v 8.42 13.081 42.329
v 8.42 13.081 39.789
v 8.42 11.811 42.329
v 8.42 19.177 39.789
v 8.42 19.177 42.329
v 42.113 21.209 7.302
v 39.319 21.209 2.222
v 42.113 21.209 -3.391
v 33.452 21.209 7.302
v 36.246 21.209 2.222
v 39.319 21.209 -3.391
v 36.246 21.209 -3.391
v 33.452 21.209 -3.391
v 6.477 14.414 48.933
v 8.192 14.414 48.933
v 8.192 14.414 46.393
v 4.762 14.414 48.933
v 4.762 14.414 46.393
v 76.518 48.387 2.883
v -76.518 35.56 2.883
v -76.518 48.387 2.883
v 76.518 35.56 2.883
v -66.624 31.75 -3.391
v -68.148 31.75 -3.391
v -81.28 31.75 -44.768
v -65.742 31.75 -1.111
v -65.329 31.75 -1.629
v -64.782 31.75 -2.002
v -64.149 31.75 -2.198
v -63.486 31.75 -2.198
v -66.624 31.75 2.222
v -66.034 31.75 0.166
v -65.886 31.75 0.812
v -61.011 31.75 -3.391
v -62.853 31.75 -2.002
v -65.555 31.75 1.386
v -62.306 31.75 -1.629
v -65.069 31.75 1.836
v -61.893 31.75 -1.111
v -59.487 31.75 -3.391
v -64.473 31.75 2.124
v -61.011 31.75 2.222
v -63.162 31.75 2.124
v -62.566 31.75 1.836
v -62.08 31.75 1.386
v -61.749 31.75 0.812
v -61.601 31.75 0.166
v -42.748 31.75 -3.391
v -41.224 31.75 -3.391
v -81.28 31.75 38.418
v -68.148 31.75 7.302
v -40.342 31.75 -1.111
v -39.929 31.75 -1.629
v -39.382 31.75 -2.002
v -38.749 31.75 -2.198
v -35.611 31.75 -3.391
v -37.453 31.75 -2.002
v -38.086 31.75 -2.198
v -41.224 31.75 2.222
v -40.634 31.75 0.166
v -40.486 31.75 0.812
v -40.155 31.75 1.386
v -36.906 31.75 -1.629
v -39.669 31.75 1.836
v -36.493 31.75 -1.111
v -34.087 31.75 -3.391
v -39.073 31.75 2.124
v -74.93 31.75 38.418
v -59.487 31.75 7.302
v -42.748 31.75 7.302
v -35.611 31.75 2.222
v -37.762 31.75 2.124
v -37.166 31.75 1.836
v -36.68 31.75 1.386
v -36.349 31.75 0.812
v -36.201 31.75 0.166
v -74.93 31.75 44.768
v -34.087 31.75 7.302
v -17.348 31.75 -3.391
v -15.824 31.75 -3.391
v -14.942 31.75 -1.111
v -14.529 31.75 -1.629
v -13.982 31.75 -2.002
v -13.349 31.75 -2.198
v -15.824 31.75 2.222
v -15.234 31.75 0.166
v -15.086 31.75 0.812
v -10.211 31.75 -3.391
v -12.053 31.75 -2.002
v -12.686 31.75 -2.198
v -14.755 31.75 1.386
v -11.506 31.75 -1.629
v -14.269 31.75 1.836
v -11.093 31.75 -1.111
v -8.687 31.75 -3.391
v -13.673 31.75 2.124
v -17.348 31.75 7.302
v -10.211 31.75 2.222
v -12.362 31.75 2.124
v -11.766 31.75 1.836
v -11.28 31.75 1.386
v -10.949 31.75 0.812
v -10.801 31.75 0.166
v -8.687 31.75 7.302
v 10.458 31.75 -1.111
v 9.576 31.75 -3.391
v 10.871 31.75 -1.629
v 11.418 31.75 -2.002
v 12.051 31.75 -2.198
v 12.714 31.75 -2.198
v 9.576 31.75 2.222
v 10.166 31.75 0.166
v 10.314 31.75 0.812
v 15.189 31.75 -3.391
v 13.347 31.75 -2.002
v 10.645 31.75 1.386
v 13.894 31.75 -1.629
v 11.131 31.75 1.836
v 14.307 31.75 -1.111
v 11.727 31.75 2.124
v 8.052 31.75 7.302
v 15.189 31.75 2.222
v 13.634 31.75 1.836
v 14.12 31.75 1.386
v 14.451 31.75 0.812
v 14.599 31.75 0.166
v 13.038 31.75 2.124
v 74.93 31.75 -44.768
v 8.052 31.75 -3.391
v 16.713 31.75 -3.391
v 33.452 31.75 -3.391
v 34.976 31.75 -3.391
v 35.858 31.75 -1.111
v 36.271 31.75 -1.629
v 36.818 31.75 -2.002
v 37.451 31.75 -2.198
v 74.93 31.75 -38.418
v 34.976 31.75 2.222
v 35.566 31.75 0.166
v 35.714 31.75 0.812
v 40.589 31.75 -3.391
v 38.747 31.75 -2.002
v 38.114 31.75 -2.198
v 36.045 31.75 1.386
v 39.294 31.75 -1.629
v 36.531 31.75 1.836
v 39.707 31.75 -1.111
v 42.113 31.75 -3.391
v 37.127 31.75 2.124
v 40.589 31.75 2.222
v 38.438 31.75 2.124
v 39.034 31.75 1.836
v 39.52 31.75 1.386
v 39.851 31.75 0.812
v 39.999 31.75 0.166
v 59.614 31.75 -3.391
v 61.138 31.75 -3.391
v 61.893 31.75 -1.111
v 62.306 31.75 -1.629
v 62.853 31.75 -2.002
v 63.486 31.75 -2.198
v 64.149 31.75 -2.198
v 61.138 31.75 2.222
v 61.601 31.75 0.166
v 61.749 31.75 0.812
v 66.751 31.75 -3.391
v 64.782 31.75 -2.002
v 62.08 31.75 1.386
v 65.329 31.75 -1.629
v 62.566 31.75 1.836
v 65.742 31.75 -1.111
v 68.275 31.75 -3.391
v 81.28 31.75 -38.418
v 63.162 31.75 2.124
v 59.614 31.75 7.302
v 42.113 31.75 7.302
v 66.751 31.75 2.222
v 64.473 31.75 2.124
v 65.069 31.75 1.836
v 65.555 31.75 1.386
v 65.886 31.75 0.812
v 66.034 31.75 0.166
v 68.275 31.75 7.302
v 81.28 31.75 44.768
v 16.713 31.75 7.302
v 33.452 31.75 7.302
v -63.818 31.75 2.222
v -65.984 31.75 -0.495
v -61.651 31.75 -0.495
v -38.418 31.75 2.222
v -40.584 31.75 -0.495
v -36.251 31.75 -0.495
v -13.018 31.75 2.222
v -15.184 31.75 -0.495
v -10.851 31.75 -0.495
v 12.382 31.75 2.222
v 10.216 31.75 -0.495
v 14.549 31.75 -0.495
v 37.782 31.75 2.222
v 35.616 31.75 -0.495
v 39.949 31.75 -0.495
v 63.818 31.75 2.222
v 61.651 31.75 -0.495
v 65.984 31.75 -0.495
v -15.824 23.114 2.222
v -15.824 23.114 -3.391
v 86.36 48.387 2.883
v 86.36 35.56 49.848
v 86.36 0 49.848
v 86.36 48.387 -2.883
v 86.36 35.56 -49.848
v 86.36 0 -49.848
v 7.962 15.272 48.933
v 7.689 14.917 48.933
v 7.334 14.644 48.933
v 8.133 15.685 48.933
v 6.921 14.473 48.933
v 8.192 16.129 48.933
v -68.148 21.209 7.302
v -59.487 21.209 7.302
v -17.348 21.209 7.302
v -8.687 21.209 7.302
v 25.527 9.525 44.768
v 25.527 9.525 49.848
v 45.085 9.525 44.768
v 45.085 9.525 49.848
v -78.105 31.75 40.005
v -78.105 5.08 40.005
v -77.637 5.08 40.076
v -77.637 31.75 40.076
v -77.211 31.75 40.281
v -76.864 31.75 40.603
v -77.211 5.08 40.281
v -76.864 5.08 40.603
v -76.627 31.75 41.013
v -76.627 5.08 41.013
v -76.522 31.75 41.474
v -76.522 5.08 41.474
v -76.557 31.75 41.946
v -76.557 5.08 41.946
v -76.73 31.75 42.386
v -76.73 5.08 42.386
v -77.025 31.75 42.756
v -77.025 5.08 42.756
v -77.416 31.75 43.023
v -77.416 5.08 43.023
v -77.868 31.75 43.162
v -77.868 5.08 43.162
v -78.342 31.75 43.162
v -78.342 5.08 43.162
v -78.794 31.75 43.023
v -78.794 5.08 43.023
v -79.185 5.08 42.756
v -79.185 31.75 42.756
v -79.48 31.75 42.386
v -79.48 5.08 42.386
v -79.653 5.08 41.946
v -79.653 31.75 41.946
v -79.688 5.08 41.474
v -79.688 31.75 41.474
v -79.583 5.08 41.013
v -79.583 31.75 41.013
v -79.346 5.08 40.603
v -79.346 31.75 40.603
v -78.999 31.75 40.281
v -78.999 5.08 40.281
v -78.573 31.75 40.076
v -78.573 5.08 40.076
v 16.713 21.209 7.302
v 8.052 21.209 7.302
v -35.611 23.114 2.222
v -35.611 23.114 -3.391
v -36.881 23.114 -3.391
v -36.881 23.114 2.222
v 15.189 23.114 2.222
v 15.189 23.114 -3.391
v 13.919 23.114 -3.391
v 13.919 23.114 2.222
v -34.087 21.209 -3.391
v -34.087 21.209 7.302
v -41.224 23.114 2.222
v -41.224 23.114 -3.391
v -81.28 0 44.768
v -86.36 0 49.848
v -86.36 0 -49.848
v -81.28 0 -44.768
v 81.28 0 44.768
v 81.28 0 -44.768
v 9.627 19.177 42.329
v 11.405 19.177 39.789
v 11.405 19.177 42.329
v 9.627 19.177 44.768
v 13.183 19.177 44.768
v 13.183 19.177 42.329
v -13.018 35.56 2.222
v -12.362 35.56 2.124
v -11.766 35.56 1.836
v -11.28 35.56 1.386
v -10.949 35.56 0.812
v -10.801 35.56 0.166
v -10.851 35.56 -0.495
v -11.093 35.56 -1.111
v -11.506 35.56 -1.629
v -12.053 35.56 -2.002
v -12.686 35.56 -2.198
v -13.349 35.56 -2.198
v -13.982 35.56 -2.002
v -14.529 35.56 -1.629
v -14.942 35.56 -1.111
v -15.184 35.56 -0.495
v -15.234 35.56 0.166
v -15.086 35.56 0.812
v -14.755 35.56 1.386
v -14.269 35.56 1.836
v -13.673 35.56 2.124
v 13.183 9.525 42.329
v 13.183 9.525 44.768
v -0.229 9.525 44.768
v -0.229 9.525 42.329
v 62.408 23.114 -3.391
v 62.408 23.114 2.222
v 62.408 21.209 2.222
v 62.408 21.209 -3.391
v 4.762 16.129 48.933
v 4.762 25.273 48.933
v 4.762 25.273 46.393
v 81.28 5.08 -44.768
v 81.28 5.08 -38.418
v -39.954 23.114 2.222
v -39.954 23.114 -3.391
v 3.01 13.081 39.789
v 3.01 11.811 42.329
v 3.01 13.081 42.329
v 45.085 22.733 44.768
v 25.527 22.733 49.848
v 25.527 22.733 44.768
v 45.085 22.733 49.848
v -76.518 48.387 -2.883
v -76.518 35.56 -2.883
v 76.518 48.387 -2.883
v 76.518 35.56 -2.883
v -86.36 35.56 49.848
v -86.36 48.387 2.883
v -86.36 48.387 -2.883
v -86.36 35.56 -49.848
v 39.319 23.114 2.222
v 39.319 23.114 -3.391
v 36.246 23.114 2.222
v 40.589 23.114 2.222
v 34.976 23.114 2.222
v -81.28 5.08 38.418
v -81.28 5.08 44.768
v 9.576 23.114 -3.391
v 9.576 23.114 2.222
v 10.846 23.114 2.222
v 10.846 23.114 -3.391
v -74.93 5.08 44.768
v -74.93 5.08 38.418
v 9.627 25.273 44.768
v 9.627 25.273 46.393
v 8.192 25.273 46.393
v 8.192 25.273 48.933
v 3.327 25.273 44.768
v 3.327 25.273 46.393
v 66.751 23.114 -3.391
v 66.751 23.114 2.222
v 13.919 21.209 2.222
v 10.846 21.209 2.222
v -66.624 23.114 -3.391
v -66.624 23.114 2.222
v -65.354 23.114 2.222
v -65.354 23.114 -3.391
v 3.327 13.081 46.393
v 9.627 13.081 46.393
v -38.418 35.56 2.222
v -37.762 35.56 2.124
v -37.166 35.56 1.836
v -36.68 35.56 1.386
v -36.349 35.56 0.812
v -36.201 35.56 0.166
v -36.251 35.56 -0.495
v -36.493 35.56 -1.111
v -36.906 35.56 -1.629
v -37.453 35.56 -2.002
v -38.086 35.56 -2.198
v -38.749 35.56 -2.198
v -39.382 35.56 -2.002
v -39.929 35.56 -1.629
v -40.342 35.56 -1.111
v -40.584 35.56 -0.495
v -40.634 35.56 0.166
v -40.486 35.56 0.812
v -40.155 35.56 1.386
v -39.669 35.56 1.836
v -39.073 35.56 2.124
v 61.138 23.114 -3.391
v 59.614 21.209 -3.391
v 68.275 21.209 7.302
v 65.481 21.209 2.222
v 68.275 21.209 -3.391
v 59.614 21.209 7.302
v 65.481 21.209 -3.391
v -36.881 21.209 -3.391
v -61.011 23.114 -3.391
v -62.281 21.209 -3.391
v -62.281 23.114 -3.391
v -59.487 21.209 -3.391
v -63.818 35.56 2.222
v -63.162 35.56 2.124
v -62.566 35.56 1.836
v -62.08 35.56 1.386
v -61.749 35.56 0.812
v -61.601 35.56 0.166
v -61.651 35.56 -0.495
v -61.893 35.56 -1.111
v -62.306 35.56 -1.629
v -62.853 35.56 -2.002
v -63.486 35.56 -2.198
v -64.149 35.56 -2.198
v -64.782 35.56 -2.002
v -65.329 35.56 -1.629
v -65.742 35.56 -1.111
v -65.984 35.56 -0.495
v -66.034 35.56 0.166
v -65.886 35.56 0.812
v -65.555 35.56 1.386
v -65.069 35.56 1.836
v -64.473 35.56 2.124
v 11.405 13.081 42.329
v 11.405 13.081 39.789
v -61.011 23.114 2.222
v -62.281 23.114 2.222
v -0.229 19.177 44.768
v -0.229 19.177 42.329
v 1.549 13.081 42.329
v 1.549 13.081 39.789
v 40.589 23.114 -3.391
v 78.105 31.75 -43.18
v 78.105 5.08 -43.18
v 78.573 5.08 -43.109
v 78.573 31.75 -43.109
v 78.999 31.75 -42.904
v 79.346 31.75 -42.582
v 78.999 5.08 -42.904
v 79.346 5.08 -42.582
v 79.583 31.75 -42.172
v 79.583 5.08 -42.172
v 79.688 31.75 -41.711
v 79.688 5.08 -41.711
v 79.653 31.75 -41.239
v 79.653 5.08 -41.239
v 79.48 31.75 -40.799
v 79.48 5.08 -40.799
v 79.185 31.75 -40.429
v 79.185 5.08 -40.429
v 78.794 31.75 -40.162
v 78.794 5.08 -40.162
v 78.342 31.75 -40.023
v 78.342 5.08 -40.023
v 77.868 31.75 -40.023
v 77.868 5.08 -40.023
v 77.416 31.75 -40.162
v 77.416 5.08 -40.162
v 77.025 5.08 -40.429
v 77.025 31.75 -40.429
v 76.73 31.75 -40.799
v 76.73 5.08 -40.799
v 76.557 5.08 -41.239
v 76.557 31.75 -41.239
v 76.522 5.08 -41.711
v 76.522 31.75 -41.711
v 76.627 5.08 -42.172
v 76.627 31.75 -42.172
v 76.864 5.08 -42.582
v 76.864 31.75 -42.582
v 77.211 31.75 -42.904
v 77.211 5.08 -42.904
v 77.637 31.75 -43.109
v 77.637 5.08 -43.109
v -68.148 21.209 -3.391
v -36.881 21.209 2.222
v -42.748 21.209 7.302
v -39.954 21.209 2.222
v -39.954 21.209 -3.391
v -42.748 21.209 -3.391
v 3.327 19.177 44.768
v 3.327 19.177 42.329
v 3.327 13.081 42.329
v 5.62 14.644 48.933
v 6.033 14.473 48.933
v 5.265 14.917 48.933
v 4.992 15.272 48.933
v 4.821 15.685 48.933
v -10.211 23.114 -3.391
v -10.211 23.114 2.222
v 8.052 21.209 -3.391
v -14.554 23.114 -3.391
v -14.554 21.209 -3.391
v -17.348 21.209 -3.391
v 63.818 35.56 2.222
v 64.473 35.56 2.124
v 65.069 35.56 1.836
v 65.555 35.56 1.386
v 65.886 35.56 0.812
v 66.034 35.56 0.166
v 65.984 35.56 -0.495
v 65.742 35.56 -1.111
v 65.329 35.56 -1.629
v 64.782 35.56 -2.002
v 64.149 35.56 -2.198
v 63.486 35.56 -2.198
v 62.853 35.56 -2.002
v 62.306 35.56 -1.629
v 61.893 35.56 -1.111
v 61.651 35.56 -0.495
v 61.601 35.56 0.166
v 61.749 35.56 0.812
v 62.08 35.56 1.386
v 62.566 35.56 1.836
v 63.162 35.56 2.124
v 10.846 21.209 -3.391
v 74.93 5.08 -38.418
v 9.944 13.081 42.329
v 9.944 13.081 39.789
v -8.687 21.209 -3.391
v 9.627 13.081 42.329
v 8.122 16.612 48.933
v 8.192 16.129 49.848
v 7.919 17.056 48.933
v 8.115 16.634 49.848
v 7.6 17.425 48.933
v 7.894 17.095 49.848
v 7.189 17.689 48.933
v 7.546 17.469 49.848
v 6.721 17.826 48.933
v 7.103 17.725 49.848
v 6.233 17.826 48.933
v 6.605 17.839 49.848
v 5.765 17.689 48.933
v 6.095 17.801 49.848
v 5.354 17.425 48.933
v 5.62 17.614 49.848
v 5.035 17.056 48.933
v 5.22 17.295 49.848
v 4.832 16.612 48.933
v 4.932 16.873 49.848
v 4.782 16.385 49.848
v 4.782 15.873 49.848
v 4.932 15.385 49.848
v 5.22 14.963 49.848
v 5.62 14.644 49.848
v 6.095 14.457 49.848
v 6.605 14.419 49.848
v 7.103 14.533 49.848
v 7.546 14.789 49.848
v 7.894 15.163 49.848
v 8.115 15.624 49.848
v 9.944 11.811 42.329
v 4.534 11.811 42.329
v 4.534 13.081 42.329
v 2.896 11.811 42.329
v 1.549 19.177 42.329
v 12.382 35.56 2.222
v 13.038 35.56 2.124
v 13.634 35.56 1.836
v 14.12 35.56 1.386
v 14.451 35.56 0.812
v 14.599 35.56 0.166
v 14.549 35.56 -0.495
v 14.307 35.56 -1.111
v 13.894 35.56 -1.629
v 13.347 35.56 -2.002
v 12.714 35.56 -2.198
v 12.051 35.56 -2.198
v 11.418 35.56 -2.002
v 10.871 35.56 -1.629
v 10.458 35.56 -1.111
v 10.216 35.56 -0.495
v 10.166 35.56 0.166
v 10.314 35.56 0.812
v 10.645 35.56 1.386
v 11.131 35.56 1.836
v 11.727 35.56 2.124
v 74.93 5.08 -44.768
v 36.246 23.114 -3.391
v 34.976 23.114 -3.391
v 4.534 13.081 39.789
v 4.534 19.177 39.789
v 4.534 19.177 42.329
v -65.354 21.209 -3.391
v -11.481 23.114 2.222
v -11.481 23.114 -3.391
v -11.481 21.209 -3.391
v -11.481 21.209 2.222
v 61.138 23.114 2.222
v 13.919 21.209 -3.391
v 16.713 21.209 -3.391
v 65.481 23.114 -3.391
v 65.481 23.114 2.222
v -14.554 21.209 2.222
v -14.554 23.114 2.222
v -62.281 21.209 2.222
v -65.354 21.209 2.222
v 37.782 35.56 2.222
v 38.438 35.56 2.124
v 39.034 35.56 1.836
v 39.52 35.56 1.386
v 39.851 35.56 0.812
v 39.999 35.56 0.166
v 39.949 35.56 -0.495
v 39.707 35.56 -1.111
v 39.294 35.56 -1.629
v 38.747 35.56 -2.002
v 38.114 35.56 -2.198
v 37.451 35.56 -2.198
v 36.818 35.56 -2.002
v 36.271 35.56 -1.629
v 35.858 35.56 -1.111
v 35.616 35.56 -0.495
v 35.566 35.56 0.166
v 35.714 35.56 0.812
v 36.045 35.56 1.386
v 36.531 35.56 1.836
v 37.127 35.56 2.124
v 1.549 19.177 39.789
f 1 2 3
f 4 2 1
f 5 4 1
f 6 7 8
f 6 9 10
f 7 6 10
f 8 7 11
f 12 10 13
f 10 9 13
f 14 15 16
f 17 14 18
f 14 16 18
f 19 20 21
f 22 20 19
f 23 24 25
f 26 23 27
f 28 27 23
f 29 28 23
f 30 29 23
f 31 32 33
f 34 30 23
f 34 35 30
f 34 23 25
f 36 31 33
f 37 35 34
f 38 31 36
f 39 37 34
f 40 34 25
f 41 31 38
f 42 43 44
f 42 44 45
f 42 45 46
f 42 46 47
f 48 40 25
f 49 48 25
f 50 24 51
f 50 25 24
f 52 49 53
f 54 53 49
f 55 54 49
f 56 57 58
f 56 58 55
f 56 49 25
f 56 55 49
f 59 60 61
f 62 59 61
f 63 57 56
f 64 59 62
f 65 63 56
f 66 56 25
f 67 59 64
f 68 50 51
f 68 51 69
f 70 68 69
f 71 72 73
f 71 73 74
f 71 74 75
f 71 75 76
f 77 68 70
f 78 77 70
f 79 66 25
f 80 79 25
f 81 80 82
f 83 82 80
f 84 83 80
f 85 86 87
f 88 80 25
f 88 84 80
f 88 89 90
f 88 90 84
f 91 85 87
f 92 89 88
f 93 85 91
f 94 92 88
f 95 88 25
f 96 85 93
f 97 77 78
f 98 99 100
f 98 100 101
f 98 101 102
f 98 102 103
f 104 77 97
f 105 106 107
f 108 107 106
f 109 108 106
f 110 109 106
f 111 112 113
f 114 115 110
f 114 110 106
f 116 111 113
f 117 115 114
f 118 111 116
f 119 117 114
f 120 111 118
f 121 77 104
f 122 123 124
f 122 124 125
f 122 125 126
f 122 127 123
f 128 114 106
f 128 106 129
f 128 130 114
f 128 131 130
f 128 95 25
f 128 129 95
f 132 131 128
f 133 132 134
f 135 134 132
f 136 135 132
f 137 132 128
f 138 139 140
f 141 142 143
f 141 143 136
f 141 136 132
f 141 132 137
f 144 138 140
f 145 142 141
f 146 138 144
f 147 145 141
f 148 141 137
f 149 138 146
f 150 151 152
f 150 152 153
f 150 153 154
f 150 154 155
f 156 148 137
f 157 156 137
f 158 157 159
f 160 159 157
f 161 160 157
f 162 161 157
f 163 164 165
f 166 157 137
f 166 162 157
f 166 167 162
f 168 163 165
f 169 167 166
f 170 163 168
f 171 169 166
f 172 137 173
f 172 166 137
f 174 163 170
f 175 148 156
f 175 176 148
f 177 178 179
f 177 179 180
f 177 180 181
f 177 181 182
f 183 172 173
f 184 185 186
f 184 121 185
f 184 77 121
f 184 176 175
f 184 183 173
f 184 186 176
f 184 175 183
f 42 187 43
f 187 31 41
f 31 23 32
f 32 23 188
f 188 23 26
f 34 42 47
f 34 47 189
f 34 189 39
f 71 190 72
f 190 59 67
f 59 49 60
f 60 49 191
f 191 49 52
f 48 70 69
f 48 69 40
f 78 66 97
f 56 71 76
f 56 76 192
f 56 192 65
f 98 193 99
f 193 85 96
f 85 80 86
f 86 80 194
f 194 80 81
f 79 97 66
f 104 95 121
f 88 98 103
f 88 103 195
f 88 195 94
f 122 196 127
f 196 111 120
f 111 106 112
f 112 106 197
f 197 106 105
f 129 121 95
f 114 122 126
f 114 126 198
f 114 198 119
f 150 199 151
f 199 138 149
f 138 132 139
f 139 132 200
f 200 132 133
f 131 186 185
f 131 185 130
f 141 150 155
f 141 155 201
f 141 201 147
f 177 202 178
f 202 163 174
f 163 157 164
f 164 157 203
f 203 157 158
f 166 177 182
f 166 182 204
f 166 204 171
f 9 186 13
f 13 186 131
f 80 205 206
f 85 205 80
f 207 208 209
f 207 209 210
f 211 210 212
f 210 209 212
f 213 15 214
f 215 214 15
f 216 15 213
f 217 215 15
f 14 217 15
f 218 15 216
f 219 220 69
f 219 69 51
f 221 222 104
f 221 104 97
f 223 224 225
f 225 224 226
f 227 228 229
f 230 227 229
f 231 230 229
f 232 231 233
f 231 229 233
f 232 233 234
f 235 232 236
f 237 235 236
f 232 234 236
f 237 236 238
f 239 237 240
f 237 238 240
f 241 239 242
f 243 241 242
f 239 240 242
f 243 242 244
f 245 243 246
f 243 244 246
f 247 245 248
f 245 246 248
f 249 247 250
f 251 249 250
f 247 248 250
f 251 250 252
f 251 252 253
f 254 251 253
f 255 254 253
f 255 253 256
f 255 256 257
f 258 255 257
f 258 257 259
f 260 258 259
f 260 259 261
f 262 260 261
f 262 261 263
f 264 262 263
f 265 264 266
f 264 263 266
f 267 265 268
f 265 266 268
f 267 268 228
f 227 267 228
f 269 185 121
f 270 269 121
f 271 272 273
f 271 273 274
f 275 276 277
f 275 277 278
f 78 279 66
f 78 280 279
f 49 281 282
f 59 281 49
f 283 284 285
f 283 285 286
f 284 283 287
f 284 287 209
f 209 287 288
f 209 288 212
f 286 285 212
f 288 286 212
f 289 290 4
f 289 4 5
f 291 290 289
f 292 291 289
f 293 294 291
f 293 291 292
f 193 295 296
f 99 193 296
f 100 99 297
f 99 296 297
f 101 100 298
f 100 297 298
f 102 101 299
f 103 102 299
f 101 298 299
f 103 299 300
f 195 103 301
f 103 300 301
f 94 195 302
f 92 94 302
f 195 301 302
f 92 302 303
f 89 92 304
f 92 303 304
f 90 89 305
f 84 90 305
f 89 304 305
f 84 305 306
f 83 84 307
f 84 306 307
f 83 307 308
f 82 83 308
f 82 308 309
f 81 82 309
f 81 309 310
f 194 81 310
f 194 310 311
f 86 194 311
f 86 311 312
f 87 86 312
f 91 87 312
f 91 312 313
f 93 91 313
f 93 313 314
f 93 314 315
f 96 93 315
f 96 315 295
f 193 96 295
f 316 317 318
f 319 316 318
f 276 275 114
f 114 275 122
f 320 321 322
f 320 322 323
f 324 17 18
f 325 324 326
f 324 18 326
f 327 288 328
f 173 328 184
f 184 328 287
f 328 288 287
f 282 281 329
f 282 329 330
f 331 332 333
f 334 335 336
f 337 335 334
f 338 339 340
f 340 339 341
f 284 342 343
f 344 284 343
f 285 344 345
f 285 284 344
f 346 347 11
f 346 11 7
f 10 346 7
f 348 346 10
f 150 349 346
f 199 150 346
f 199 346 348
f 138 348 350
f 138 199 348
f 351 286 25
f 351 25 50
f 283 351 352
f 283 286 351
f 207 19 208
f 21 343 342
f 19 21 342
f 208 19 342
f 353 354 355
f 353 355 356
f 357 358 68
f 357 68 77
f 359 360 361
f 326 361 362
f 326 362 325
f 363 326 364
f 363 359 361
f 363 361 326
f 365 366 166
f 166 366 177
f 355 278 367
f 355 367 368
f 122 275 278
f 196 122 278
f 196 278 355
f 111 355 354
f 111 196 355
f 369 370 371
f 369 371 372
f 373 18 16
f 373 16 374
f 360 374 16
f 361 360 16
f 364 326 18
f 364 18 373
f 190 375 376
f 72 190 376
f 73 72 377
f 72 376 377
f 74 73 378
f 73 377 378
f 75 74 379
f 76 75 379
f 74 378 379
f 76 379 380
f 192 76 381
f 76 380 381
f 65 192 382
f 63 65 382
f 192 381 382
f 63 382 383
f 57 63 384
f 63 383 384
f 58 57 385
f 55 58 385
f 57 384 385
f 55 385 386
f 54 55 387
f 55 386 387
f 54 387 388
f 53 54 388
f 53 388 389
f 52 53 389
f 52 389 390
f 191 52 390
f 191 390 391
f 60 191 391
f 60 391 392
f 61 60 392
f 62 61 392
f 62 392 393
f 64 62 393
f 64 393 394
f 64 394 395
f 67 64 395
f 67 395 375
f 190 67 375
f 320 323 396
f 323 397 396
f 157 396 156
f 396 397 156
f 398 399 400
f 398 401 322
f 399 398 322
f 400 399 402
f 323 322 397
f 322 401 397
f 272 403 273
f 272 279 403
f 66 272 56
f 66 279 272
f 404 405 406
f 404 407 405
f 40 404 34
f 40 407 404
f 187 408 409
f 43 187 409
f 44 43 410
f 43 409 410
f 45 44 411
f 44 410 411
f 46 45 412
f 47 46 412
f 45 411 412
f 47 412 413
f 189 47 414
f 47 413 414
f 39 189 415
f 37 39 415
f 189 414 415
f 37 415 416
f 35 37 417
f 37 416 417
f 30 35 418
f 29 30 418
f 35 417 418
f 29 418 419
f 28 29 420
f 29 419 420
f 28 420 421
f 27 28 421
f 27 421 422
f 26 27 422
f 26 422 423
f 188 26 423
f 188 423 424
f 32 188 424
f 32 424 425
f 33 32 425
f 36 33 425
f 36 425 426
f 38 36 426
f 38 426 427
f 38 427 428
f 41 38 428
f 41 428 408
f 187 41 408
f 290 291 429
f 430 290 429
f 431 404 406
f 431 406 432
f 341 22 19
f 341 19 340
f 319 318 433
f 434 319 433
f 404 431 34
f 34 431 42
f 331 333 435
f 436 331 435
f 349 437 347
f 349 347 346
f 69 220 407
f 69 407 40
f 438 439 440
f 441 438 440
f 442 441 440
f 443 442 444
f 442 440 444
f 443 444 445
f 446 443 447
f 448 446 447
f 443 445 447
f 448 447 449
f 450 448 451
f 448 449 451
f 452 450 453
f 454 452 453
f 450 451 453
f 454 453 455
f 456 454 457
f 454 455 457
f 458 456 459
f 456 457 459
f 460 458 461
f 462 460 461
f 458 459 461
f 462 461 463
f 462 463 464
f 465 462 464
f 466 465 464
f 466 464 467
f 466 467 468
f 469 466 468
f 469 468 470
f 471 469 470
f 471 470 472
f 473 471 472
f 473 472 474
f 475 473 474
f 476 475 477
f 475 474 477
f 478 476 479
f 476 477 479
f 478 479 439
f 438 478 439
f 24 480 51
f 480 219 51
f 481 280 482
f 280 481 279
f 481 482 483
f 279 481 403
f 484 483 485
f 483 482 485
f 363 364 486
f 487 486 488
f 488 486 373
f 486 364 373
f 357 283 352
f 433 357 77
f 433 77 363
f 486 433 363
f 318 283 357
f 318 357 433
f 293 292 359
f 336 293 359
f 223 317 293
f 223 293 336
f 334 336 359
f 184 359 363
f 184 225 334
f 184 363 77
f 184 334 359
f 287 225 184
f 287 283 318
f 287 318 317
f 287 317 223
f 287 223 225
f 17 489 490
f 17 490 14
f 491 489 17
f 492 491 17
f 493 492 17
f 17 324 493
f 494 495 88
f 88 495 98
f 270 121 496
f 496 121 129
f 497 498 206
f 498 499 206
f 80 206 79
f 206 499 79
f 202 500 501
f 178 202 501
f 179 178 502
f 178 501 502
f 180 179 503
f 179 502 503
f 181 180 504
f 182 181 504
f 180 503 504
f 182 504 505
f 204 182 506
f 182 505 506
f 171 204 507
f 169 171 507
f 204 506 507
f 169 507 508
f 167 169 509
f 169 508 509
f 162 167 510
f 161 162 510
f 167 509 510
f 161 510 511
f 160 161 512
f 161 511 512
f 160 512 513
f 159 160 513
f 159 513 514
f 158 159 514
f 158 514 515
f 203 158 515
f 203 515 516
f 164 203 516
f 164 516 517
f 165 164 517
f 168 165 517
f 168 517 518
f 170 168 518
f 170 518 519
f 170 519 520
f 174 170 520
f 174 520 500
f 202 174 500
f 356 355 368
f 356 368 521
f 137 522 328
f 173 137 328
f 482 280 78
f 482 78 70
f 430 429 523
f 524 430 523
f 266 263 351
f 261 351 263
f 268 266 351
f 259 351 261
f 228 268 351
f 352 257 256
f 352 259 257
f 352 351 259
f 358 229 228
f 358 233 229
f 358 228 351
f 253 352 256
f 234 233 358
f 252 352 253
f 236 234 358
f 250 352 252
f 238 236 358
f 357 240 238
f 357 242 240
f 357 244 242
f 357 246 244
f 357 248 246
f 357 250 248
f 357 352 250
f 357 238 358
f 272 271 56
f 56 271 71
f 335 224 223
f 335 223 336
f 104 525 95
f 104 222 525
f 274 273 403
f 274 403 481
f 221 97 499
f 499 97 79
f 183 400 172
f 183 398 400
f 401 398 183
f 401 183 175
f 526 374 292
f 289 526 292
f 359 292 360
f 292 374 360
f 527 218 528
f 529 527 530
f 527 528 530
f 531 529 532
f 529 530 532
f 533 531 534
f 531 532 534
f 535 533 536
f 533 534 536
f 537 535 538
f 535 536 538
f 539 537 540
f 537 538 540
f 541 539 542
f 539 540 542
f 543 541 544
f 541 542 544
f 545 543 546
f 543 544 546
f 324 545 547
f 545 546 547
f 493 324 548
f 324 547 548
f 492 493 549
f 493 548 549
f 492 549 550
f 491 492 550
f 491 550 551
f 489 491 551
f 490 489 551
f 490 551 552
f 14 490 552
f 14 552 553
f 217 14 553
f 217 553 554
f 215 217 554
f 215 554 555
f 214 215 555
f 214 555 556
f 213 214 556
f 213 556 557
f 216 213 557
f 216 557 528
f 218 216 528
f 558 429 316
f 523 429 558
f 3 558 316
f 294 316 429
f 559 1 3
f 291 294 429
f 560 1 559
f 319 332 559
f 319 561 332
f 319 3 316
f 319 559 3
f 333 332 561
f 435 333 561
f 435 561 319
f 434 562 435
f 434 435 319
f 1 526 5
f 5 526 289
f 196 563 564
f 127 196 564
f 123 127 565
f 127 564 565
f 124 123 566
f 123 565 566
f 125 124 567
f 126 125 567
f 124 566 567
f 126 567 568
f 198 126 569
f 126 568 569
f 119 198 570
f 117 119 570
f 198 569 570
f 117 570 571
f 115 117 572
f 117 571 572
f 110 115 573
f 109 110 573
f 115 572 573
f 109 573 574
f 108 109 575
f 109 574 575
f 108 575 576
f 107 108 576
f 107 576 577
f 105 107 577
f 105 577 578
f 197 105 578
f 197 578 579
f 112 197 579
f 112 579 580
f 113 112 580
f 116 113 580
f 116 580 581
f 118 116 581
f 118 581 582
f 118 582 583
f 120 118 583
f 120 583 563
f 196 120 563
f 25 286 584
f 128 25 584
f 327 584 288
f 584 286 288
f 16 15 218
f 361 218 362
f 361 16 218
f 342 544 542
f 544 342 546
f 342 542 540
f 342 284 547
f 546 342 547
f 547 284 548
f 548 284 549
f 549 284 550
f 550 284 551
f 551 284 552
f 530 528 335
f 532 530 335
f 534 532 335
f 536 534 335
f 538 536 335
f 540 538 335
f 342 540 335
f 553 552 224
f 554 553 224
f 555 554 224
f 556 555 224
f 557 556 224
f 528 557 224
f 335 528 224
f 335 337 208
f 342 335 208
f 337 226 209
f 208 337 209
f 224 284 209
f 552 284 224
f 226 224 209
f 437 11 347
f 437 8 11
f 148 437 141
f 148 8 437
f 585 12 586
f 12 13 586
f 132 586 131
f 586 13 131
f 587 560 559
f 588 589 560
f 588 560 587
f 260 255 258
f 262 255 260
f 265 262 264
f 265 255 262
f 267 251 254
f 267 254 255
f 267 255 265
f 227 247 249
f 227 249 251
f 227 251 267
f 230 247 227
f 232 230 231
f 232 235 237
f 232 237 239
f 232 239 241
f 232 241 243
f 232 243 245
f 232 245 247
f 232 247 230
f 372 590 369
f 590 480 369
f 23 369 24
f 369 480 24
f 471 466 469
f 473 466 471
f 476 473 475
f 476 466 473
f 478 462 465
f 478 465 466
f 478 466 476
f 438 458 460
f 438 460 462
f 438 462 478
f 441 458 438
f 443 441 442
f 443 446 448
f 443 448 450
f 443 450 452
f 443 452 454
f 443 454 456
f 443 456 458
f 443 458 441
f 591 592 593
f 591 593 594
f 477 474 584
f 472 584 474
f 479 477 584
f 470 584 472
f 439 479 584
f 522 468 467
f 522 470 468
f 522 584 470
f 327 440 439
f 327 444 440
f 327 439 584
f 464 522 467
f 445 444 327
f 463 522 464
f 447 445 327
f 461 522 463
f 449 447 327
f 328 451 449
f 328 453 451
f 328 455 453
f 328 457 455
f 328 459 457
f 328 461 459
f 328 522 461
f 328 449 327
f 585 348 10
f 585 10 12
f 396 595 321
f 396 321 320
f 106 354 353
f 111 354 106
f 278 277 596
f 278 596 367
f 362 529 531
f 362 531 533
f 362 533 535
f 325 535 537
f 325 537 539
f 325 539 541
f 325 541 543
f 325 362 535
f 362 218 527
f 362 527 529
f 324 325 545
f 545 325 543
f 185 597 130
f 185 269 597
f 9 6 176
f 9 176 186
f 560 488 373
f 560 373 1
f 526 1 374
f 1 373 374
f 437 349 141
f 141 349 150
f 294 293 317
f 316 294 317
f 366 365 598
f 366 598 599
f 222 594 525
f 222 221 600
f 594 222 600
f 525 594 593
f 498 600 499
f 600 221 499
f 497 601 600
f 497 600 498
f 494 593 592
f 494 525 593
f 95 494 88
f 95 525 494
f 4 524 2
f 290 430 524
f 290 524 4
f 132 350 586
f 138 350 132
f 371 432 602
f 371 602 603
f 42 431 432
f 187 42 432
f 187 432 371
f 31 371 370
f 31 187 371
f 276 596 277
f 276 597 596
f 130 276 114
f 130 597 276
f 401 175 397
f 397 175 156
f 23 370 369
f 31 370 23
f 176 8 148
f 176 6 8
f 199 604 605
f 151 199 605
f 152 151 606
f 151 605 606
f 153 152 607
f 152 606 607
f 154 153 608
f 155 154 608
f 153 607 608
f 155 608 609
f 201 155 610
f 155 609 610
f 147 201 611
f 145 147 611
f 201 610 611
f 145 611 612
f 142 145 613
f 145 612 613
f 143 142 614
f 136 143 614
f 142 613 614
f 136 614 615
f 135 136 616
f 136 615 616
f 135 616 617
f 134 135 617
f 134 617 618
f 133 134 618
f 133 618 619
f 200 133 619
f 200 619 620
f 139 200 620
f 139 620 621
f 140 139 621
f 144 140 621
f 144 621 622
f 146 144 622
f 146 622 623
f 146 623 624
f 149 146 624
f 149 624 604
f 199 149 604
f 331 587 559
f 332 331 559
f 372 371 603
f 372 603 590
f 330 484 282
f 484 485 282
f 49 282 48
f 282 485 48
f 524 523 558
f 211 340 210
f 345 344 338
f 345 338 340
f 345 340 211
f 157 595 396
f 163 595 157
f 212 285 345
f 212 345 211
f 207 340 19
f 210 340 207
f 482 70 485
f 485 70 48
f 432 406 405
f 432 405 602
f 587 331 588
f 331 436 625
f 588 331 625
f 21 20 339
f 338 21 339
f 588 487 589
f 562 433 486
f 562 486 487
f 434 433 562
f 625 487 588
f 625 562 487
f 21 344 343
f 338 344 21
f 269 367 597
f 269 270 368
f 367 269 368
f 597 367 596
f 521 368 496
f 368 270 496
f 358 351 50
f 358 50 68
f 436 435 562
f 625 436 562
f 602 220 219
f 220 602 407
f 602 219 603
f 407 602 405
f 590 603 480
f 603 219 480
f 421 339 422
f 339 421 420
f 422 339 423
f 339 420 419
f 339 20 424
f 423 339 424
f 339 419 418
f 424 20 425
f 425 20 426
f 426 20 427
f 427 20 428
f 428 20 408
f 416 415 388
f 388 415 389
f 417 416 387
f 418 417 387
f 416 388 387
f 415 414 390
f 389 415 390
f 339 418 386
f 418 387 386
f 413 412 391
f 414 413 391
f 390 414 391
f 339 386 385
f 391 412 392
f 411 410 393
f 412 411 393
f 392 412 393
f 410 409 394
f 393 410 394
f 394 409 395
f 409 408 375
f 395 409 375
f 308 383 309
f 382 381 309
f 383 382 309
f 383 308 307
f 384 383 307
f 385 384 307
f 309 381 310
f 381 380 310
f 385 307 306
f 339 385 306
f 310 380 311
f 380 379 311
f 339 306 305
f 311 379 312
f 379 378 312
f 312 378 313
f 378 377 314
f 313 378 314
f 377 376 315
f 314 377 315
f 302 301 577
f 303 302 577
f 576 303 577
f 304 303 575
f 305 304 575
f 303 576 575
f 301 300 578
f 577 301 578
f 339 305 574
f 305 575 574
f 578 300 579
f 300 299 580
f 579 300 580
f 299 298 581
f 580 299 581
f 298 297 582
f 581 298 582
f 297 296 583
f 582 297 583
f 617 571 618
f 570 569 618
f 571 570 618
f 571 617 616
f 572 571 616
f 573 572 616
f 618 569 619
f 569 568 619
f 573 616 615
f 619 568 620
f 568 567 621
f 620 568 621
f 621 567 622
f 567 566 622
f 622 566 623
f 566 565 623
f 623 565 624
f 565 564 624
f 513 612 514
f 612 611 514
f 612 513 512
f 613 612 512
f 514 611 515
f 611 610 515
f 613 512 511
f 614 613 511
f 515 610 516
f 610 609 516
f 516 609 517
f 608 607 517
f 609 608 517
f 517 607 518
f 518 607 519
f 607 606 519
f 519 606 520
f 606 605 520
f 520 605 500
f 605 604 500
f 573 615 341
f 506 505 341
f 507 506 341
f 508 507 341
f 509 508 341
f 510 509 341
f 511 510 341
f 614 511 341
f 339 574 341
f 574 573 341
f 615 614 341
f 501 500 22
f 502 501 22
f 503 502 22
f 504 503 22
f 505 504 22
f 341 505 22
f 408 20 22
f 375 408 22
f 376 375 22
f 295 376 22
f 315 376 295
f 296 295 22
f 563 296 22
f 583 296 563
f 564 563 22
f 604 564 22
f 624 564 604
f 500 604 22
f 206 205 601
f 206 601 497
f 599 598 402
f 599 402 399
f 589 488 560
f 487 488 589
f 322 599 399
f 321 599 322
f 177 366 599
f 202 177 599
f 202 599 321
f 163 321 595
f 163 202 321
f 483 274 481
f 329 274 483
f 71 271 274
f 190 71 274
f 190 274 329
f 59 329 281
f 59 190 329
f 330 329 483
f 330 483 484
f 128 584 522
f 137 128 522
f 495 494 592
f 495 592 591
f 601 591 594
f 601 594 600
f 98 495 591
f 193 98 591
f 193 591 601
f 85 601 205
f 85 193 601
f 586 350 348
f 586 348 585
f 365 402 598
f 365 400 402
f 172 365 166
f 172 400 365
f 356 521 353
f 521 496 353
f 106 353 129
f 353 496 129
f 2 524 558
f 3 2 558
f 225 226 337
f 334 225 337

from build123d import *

# Parameters (mm, degrees)
SKETCH1_W            = 172.72
SKETCH1_H            = 99.695
BOSS_EXTRUDE1_DEPTH  = 38.1
SKETCH2_W            = 162.56
SKETCH2_H            = 89.535
CUT_EXTRUDE1_DEPTH   = 31.75
SKETCH3_W            = 6.35
SKETCH3_H            = 6.35
BOSS_EXTRUDE2_DEPTH  = 26.67
SKETCH7_R            = 1.5875
CUT_EXTRUDE3_DEPTH   = 26.67
SKETCH8_W            = 19.558
SKETCH8_H            = 13.208
CUT_EXTRUDE4_DEPTH   = 5.08
SKETCH9_R            = 1.7145
CUT_EXTRUDE6_DEPTH   = 3.4544
SKETCH11_W           = 6.2992
SKETCH11_H           = 12.192
CUT_EXTRUDE7_DEPTH   = 1.6256
SKETCH14_W           = 6.2992
SKETCH14_H           = 3.556
BOSS_EXTRUDE3_DEPTH  = 2.4384
SKETCH22_W           = 3.429
SKETCH22_H           = 10.8585
CUT_EXTRUDE8_DEPTH   = 2.54
BOSS_EXTRUDE16_DEPTH = 2.54
BOSS_EXTRUDE18_DEPTH = 2.54
SKETCH28_W           = 2.54
SKETCH28_H           = 6.096
BOSS_EXTRUDE19_DEPTH = 1.2065
SKETCH29_W           = 2.54
SKETCH29_H           = 6.096
BOSS_EXTRUDE20_DEPTH = 1.2065
CUT_EXTRUDE12_DEPTH  = 7.0485
SKETCH33_W           = 172.72
SKETCH33_H           = 2.54
CUT_EXTRUDE13_DEPTH  = 138.29075943
SKETCH36_W           = 172.72
SKETCH36_H           = 46.9646
BOSS_EXTRUDE21_DEPTH = 12.827
CUT_EXTRUDE14_DEPTH  = 187.167326417
SKETCH41_W           = 9.8425
SKETCH41_H           = 5.7658
BOSS_EXTRUDE22_DEPTH = 12.827
SKETCH42_R           = 2.2225
CUT_EXTRUDE15_DEPTH  = 106.864708266
SKETCH44_W           = 8.6614
SKETCH44_H           = 5.08
BOSS_EXTRUDE24_DEPTH = 10.541
SKETCH46_W           = 1.524
SKETCH46_H           = 10.541
BOSS_EXTRUDE25_DEPTH = 5.6134
SKETCH48_W           = 5.6134
SKETCH48_H           = 1.905
BOSS_EXTRUDE26_DEPTH = 1.27
SKETCH49_W           = 5.6134
SKETCH49_H           = 1.905
BOSS_EXTRUDE27_DEPTH = 1.27
SKETCH50_W           = 5.6134
SKETCH50_H           = 1.905
BOSS_EXTRUDE28_DEPTH = 1.27
SKETCH51_W           = 5.6134
SKETCH51_H           = 1.905
BOSS_EXTRUDE29_DEPTH = 1.27
SKETCH52_W           = 5.6134
SKETCH52_H           = 1.905
BOSS_EXTRUDE30_DEPTH = 1.27
SKETCH53_W           = 5.6134
SKETCH53_H           = 1.905
BOSS_EXTRUDE31_DEPTH = 1.27
SKETCH54_W           = 5.6134
SKETCH54_H           = 1.905
BOSS_EXTRUDE32_DEPTH = 1.27
SKETCH55_W           = 5.6134
SKETCH55_H           = 1.905
BOSS_EXTRUDE33_DEPTH = 1.27
SKETCH56_W           = 5.6134
SKETCH56_H           = 1.905
BOSS_EXTRUDE34_DEPTH = 1.27
SKETCH57_W           = 5.6134
SKETCH57_H           = 1.905
BOSS_EXTRUDE35_DEPTH = 1.27
SKETCH58_W           = 5.6134
SKETCH58_H           = 1.905
BOSS_EXTRUDE36_DEPTH = 1.27
SKETCH59_W           = 5.6134
SKETCH59_H           = 1.905
BOSS_EXTRUDE37_DEPTH = 1.27


with BuildPart() as part:
    # Sketch1 → Boss-Extrude1 (new body)
    with BuildSketch(Plane(origin=(0, 0, 0), x_dir=(1, 0, 0), z_dir=(0, 1, 0))):
        Rectangle(SKETCH1_W, SKETCH1_H)
    extrude(amount=BOSS_EXTRUDE1_DEPTH)

    # Sketch2 → Cut-Extrude1 (cut)
    with BuildSketch(Plane.XZ):
        Rectangle(SKETCH2_W, SKETCH2_H)
    extrude(amount=-CUT_EXTRUDE1_DEPTH, mode=Mode.SUBTRACT)

    # Sketch3 → Boss-Extrude2 (add)
    with BuildSketch(Plane.XZ.offset(-31.75)):
        with Locations((-78.105, 41.5925)):
            Rectangle(SKETCH3_W, SKETCH3_H)
        with Locations((78.105, -41.5925)):
            Rectangle(SKETCH3_W, SKETCH3_H)
    extrude(amount=BOSS_EXTRUDE2_DEPTH)

    # Sketch7 → Cut-Extrude3 (cut)
    with BuildSketch(Plane.XZ.offset(-5.08)):
        with Locations(Location((-78.105, 41.5925, 0), (0, 0, 270))):
            Circle(SKETCH7_R)
        with Locations(Location((78.105, -41.5925, 0), (0, 0, 270))):
            Circle(SKETCH7_R)
    extrude(amount=-CUT_EXTRUDE3_DEPTH, mode=Mode.SUBTRACT)

    # Sketch8 → Cut-Extrude4 (cut)
    with BuildSketch(Plane.XY.offset(49.8475)):
        with Locations((35.306, 16.129)):
            Rectangle(SKETCH8_W, SKETCH8_H)
    extrude(amount=-CUT_EXTRUDE4_DEPTH, mode=Mode.SUBTRACT)

    # Sketch9 → Cut-Extrude6 (cut)
    with BuildSketch(Plane.XY.offset(49.8475)):
        with Locations((6.477, 16.129)):
            Circle(SKETCH9_R)
    extrude(amount=-CUT_EXTRUDE6_DEPTH, mode=Mode.SUBTRACT)

    # Sketch11 → Cut-Extrude7 (cut)
    with BuildSketch(Plane(origin=(0, 0, 44.7675), x_dir=(-1, 0, 0), z_dir=(0, 0, -1))):
        with Locations((-6.477, 19.177)):
            Rectangle(SKETCH11_W, SKETCH11_H)
    extrude(amount=-CUT_EXTRUDE7_DEPTH, mode=Mode.SUBTRACT)

    # Sketch14 → Boss-Extrude3 (add)
    with BuildSketch(Plane(origin=(0, 0, 44.7675), x_dir=(-1, 0, 0), z_dir=(0, 0, -1))):
        Polygon((-9.6266, 9.525), (-9.6266, 13.081), (-9.6266, 19.177), (-13.1826, 19.177), (-13.1826, 9.525), align=None)
        with Locations((-6.477, 11.303)):
            Rectangle(SKETCH14_W, SKETCH14_H)
        Polygon((-3.3274, 19.177), (-3.3274, 13.081), (-3.3274, 9.525), (0.2286, 9.525), (0.2286, 19.177), align=None)
    extrude(amount=BOSS_EXTRUDE3_DEPTH)

    # Sketch22 → Cut-Extrude8 (cut)
    with BuildSketch(Plane(origin=(0, 0, 46.3931), x_dir=(-1, 0, 0), z_dir=(0, 0, -1))):
        with Locations((-6.477, 19.84375)):
            Rectangle(SKETCH22_W, SKETCH22_H)
    extrude(amount=-CUT_EXTRUDE8_DEPTH, mode=Mode.SUBTRACT)

    # Sketch25 → Boss-Extrude16 (add)
    with BuildSketch(Plane(origin=(0, 0, 42.3291), x_dir=(-1, 0, 0), z_dir=(0, 0, -1))):
        Polygon((-9.9441, 13.081), (-9.6266, 13.081), (-9.6266, 19.177), (-11.4046, 19.177), (-11.4046, 13.081), align=None)
        Polygon((-3.3274, 19.177), (-3.3274, 13.081), (-3.0734, 13.081), (-3.0099, 13.081), (-1.5494, 13.081), (-1.5494, 19.177), align=None)
    extrude(amount=BOSS_EXTRUDE16_DEPTH)

    # Sketch25<7> → Boss-Extrude18 (add)
    with BuildSketch(Plane(origin=(0, 0, 42.3291), x_dir=(-1, 0, 0), z_dir=(0, 0, -1))):
        Polygon((-8.4201, 11.811), (-8.4201, 13.081), (-9.6266, 13.081), (-9.9441, 13.081), (-9.9441, 11.811), align=None)
        Polygon((-3.3274, 13.081), (-4.5339, 13.081), (-4.5339, 11.811), (-3.0099, 11.811), (-3.0099, 13.081), (-3.0734, 13.081), align=None)
    extrude(amount=BOSS_EXTRUDE18_DEPTH)

    # Sketch28 → Boss-Extrude19 (add)
    with BuildSketch(Plane(origin=(3.3274, 0, 0), x_dir=(0, 0, -1), z_dir=(1, 0, 0))):
        with Locations((-41.0591, 16.129)):
            Rectangle(SKETCH28_W, SKETCH28_H)
    extrude(amount=BOSS_EXTRUDE19_DEPTH)

    # Sketch29 → Boss-Extrude20 (add)
    with BuildSketch(Plane.ZY.offset(-9.6266)):
        with Locations((41.0591, 16.129)):
            Rectangle(SKETCH29_W, SKETCH29_H)
    extrude(amount=BOSS_EXTRUDE20_DEPTH)

    # Sketch30 → Cut-Extrude12 (cut)
    with BuildSketch(Plane(origin=(9.9441, 0, 0), x_dir=(0, 0, -1), z_dir=(1, 0, 0))):
        Polygon((-39.7891, 13.081), (-42.3291, 11.811), (-39.7891, 11.811), align=None)
    extrude(amount=-CUT_EXTRUDE12_DEPTH, mode=Mode.SUBTRACT)

    # Sketch33 → Cut-Extrude13 (cut, through all)
    with BuildSketch(Plane.XY.offset(49.8475)):
        with Locations((0, 36.83)):
            Rectangle(SKETCH33_W, SKETCH33_H)
    extrude(amount=-CUT_EXTRUDE13_DEPTH, mode=Mode.SUBTRACT)

    # Sketch36 → Boss-Extrude21 (add)
    with BuildSketch(Plane(origin=(0, 35.56, 0), x_dir=(1, 0, 0), z_dir=(0, 1, 0))):
        with Locations((0, 26.3652)):
            Rectangle(SKETCH36_W, SKETCH36_H)
        with Locations((0, -26.3652)):
            Rectangle(SKETCH36_W, SKETCH36_H)
    extrude(amount=BOSS_EXTRUDE21_DEPTH)

    # Sketch37 → Cut-Extrude14 (cut, through all)
    with BuildSketch(Plane.ZY.offset(86.36)):
        Polygon((-49.8475, 35.56), (-49.8475, 48.387), (-2.8829, 48.387), align=None)
        Polygon((2.8829, 48.387), (49.8475, 35.56), (49.8475, 48.387), align=None)
    extrude(amount=-CUT_EXTRUDE14_DEPTH, mode=Mode.SUBTRACT)

    # Sketch41 → Boss-Extrude22 (add, through all)
    with BuildSketch(Plane(origin=(0, 35.56, 0), x_dir=(1, 0, 0), z_dir=(0, 1, 0))):
        with Locations((-81.43875, 0)):
            Rectangle(SKETCH41_W, SKETCH41_H)
        with Locations((81.43875, 0)):
            Rectangle(SKETCH41_W, SKETCH41_H)
    extrude(amount=BOSS_EXTRUDE22_DEPTH)

    # Sketch42 → Cut-Extrude15 (cut, through all)
    with BuildSketch(Plane(origin=(0, 35.56, 0), x_dir=(1, 0, 0), z_dir=(0, 1, 0))):
        with Locations(Location((-63.8175, 0, 0), (0, 0, 270))):
            Circle(SKETCH42_R)
        with Locations(Location((63.8175, 0, 0), (0, 0, 270))):
            Circle(SKETCH42_R)
        with Locations(Location((-38.4175, 0, 0), (0, 0, 270))):
            Circle(SKETCH42_R)
        with Locations(Location((-13.0175, 0, 0), (0, 0, 270))):
            Circle(SKETCH42_R)
        with Locations(Location((12.3825, 0, 0), (0, 0, 270))):
            Circle(SKETCH42_R)
        with Locations(Location((37.7825, 0, 0), (0, 0, 270))):
            Circle(SKETCH42_R)
    extrude(amount=-CUT_EXTRUDE15_DEPTH, mode=Mode.SUBTRACT)

    # Sketch44 → Boss-Extrude24 (add)
    with BuildSketch(Plane(origin=(0, 31.75, 0), x_dir=(-1, 0, 0), z_dir=(0, -1, 0))):
        with Locations((38.4175, -4.7625)):
            Rectangle(SKETCH44_W, SKETCH44_H)
        with Locations((63.8175, -4.7625)):
            Rectangle(SKETCH44_W, SKETCH44_H)
        with Locations((13.0175, -4.7625)):
            Rectangle(SKETCH44_W, SKETCH44_H)
        with Locations((-12.3825, -4.7625)):
            Rectangle(SKETCH44_W, SKETCH44_H)
        with Locations((-37.7825, -4.7625)):
            Rectangle(SKETCH44_W, SKETCH44_H)
        with Locations((-63.9445, -4.7625)):
            Rectangle(SKETCH44_W, SKETCH44_H)
    extrude(amount=BOSS_EXTRUDE24_DEPTH)

    # Sketch46 → Boss-Extrude25 (add)
    with BuildSketch(Plane(origin=(0, 0, 2.2225), x_dir=(-1, 0, 0), z_dir=(0, 0, -1))):
        with Locations((67.3862, 26.4795)):
            Rectangle(SKETCH46_W, SKETCH46_H)
        with Locations((41.9862, 26.4795)):
            Rectangle(SKETCH46_W, SKETCH46_H)
        with Locations((60.2488, 26.4795)):
            Rectangle(SKETCH46_W, SKETCH46_H)
        with Locations((34.8488, 26.4795)):
            Rectangle(SKETCH46_W, SKETCH46_H)
        with Locations((16.5862, 26.4795)):
            Rectangle(SKETCH46_W, SKETCH46_H)
        with Locations((9.4488, 26.4795)):
            Rectangle(SKETCH46_W, SKETCH46_H)
        with Locations((-8.8138, 26.4795)):
            Rectangle(SKETCH46_W, SKETCH46_H)
        with Locations((-15.9512, 26.4795)):
            Rectangle(SKETCH46_W, SKETCH46_H)
        with Locations((-34.2138, 26.4795)):
            Rectangle(SKETCH46_W, SKETCH46_H)
        with Locations((-41.3512, 26.4795)):
            Rectangle(SKETCH46_W, SKETCH46_H)
        with Locations((-60.3758, 26.4795)):
            Rectangle(SKETCH46_W, SKETCH46_H)
        with Locations((-67.5132, 26.4795)):
            Rectangle(SKETCH46_W, SKETCH46_H)
    extrude(amount=BOSS_EXTRUDE25_DEPTH)

    # Sketch48 → Boss-Extrude26 (add)
    with BuildSketch(Plane.ZY.offset(-66.7512)):
        with Locations((-0.5842, 22.1615)):
            Rectangle(SKETCH48_W, SKETCH48_H)
    extrude(amount=BOSS_EXTRUDE26_DEPTH)

    # Sketch49 → Boss-Extrude27 (add)
    with BuildSketch(Plane(origin=(61.1378, 0, 0), x_dir=(0, 0, -1), z_dir=(1, 0, 0))):
        with Locations((0.5842, 22.1615)):
            Rectangle(SKETCH49_W, SKETCH49_H)
    extrude(amount=BOSS_EXTRUDE27_DEPTH)

    # Sketch50 → Boss-Extrude28 (add)
    with BuildSketch(Plane.ZY.offset(-40.5892)):
        with Locations((-0.5842, 22.1615)):
            Rectangle(SKETCH50_W, SKETCH50_H)
    extrude(amount=BOSS_EXTRUDE28_DEPTH)

    # Sketch51 → Boss-Extrude29 (add)
    with BuildSketch(Plane(origin=(34.9758, 0, 0), x_dir=(0, 0, -1), z_dir=(1, 0, 0))):
        with Locations((0.5842, 22.1615)):
            Rectangle(SKETCH51_W, SKETCH51_H)
    extrude(amount=BOSS_EXTRUDE29_DEPTH)

    # Sketch52 → Boss-Extrude30 (add)
    with BuildSketch(Plane.ZY.offset(-15.1892)):
        with Locations((-0.5842, 22.1615)):
            Rectangle(SKETCH52_W, SKETCH52_H)
    extrude(amount=BOSS_EXTRUDE30_DEPTH)

    # Sketch53 → Boss-Extrude31 (add)
    with BuildSketch(Plane(origin=(9.5758, 0, 0), x_dir=(0, 0, -1), z_dir=(1, 0, 0))):
        with Locations((0.5842, 22.1615)):
            Rectangle(SKETCH53_W, SKETCH53_H)
    extrude(amount=BOSS_EXTRUDE31_DEPTH)

    # Sketch54 → Boss-Extrude32 (add)
    with BuildSketch(Plane.ZY.offset(10.2108)):
        with Locations((-0.5842, 22.1615)):
            Rectangle(SKETCH54_W, SKETCH54_H)
    extrude(amount=BOSS_EXTRUDE32_DEPTH)

    # Sketch55 → Boss-Extrude33 (add)
    with BuildSketch(Plane(origin=(-15.8242, 0, 0), x_dir=(0, 0, -1), z_dir=(1, 0, 0))):
        with Locations((0.5842, 22.1615)):
            Rectangle(SKETCH55_W, SKETCH55_H)
    extrude(amount=BOSS_EXTRUDE33_DEPTH)

    # Sketch56 → Boss-Extrude34 (add)
    with BuildSketch(Plane.ZY.offset(35.6108)):
        with Locations((-0.5842, 22.1615)):
            Rectangle(SKETCH56_W, SKETCH56_H)
    extrude(amount=BOSS_EXTRUDE34_DEPTH)

    # Sketch57 → Boss-Extrude35 (add)
    with BuildSketch(Plane(origin=(-41.2242, 0, 0), x_dir=(0, 0, -1), z_dir=(1, 0, 0))):
        with Locations((0.5842, 22.1615)):
            Rectangle(SKETCH57_W, SKETCH57_H)
    extrude(amount=BOSS_EXTRUDE35_DEPTH)

    # Sketch58 → Boss-Extrude36 (add)
    with BuildSketch(Plane.ZY.offset(61.0108)):
        with Locations((-0.5842, 22.1615)):
            Rectangle(SKETCH58_W, SKETCH58_H)
    extrude(amount=BOSS_EXTRUDE36_DEPTH)

    # Sketch59 → Boss-Extrude37 (add)
    with BuildSketch(Plane(origin=(-66.6242, 0, 0), x_dir=(0, 0, -1), z_dir=(1, 0, 0))):
        with Locations((0.5842, 22.1615)):
            Rectangle(SKETCH59_W, SKETCH59_H)
    extrude(amount=BOSS_EXTRUDE37_DEPTH)


solid = part.part
